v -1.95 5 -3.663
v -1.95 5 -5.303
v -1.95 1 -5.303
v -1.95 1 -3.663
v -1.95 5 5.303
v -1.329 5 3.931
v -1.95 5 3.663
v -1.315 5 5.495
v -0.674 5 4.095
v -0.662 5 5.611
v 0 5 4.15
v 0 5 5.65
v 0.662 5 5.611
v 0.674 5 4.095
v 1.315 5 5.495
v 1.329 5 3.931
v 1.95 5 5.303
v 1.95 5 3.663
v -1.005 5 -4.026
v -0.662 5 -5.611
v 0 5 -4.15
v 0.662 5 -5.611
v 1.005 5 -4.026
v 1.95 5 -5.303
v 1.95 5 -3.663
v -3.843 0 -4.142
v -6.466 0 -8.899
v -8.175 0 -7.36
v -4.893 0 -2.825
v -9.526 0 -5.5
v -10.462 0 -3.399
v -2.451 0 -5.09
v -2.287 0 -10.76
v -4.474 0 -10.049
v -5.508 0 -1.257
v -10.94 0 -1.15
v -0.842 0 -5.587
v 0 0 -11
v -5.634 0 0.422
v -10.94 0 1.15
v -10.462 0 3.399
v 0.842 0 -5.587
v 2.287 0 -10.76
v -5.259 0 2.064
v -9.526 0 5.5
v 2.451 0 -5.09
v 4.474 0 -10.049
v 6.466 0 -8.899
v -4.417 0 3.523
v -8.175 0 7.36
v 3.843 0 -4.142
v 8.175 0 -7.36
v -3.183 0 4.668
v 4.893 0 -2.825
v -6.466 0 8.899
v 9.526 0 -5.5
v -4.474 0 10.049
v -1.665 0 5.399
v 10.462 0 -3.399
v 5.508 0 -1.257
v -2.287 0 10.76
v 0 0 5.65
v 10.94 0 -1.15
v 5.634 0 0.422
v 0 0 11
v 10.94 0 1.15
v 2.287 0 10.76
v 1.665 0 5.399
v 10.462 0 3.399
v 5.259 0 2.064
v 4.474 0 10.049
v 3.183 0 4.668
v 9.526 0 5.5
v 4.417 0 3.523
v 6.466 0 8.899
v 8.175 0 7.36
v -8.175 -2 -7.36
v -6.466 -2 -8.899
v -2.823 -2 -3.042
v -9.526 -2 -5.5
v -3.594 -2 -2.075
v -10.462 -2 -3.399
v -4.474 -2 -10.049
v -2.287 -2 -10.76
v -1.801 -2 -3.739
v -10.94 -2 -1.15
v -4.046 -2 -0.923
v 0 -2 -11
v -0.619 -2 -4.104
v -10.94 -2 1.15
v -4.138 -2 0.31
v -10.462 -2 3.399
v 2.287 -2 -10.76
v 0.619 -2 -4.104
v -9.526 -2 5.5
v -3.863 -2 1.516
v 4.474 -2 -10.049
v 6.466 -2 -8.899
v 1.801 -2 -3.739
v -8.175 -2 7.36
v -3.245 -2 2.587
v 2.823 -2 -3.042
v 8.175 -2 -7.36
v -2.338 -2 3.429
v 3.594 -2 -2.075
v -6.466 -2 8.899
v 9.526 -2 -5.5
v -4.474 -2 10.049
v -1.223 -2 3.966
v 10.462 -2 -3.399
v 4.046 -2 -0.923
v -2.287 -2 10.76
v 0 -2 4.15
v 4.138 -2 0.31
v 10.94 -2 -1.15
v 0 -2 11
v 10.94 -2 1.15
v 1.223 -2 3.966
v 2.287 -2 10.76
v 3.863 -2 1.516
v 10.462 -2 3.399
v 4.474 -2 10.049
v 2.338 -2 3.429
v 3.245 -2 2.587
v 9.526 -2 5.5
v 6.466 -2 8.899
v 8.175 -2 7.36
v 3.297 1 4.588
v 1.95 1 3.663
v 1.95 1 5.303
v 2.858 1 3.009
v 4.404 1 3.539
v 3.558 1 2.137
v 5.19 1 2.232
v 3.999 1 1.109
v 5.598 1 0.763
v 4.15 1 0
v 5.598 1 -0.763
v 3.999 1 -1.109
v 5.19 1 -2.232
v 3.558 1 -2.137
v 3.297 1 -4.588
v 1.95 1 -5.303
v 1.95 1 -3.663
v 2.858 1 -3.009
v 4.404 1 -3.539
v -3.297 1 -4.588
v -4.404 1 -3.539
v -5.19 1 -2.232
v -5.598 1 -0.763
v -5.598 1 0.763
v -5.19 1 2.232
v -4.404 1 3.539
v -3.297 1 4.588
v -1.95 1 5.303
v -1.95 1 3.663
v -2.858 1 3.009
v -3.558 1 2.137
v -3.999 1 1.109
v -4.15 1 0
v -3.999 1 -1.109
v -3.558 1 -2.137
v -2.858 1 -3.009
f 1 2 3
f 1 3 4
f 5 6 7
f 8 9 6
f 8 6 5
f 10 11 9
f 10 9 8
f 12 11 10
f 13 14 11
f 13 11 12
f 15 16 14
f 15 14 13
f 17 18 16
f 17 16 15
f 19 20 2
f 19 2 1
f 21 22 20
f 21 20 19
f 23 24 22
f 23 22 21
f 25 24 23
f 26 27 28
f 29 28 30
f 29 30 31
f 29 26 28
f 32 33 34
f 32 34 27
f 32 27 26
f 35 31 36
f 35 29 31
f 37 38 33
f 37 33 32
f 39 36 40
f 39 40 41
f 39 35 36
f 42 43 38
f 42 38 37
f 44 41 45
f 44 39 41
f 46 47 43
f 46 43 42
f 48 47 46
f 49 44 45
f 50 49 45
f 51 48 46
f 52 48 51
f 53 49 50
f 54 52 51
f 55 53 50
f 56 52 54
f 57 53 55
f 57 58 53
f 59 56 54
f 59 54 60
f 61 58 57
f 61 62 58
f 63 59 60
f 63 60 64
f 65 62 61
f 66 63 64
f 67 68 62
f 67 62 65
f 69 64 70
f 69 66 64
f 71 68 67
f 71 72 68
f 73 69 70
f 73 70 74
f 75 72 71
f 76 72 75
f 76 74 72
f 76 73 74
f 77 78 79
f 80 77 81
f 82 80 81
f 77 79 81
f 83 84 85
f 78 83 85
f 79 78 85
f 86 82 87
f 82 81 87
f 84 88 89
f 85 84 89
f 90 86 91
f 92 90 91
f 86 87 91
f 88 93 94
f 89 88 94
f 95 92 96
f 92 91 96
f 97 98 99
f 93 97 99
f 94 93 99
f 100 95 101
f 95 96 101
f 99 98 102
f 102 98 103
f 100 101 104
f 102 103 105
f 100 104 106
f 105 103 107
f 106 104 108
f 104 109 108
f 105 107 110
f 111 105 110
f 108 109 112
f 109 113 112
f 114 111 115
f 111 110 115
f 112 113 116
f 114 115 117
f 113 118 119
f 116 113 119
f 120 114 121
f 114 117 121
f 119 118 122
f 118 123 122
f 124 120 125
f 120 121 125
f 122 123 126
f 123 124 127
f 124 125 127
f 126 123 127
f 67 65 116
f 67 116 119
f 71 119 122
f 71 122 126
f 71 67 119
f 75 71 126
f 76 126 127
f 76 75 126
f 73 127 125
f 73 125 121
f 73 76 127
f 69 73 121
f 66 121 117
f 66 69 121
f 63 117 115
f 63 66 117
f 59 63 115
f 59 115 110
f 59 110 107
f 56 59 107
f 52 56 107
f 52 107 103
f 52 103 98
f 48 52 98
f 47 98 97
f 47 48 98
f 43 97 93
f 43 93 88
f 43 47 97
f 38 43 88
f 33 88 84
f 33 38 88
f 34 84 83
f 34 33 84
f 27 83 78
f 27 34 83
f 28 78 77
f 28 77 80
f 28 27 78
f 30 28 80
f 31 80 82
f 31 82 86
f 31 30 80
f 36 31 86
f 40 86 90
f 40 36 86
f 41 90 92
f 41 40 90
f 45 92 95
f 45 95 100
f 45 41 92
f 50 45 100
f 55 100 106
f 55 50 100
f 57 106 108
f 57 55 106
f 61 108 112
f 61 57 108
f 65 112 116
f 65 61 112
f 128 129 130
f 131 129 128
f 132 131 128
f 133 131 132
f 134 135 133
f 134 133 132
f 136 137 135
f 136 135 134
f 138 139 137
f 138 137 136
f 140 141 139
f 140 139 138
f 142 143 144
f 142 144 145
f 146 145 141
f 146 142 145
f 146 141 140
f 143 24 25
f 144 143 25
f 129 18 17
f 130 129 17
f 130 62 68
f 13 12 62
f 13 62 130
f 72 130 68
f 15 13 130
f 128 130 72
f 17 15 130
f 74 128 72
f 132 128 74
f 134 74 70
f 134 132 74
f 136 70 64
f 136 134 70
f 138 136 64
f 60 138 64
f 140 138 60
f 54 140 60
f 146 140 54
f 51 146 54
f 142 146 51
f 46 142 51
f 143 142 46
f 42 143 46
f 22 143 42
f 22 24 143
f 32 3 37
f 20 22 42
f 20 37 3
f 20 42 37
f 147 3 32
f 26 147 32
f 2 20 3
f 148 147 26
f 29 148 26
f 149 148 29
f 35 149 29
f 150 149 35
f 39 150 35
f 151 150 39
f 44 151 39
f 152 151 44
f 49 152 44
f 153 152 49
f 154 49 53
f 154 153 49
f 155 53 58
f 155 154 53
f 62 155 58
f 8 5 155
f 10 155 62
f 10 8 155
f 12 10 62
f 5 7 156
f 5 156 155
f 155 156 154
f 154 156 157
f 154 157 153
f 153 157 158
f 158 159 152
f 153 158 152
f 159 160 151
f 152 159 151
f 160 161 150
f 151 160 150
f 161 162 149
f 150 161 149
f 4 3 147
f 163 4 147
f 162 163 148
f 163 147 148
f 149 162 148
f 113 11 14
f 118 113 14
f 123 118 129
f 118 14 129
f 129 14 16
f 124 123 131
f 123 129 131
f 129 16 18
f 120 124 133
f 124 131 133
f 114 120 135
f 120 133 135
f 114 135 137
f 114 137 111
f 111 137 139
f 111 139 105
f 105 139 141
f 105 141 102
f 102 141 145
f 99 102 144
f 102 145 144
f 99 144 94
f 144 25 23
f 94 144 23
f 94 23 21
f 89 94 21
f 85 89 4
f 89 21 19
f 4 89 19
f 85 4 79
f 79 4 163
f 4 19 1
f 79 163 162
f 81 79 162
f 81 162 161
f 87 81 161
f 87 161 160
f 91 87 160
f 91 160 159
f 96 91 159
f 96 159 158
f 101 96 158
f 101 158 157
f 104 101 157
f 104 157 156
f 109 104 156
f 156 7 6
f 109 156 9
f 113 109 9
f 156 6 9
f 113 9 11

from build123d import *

# Parameters (mm, degrees)
SKETCH_1_R          = 11
SKETCH_1_R_2        = 4.15
EXTRUDE_1_DEPTH     = 2
EXTRUDE_START       = 5
SKETCH_1_3_R        = 5.65
SKETCH_1_3_R_2      = 4.15
EXTRUDE_2_DEPTH     = 5
CUT_EXTRUDE_1_DEPTH = 4


with BuildPart() as part:
    # 草图1 → 凸台-拉伸1 (new body)
    with BuildSketch(Plane(origin=(0, 0, 0), x_dir=(1, 0, 0), z_dir=(0, 1, 0))):
        Circle(SKETCH_1_R)
        Circle(SKETCH_1_R_2, mode=Mode.SUBTRACT)
    extrude(amount=-EXTRUDE_1_DEPTH)

    # 草图1<3> → 凸台-拉伸2 (add)
    with BuildSketch(Plane(origin=(0, 0, 0), x_dir=(1, 0, 0), z_dir=(0, 1, 0)).offset(EXTRUDE_START)):
        Circle(SKETCH_1_3_R)
        Circle(SKETCH_1_3_R_2, mode=Mode.SUBTRACT)
    extrude(amount=-EXTRUDE_2_DEPTH)

    # 草图2 → 切除-拉伸1 (cut)
    with BuildSketch(Plane(origin=(0, 5, 0), x_dir=(1, 0, 0), z_dir=(0, 1, 0))):
        with BuildLine():
            Line((1.95, 5.302829433), (1.95, 3.663331817))
            ThreePointArc((1.95, 3.663331817), (4.15, 0), (1.95, -3.663331817))
            Line((1.95, -3.663331817), (1.95, -5.302829433))
            ThreePointArc((1.95, -5.302829433), (5.65, 0), (1.95, 5.302829433))
        make_face()
        with BuildLine():
            Line((-1.95, 5.302829433), (-1.95, 3.663331817))
            ThreePointArc((-1.95, 3.663331817), (-4.15, 0), (-1.95, -3.663331817))
            Line((-1.95, -3.663331817), (-1.95, -5.302829433))
            ThreePointArc((-1.95, -5.302829433), (-5.65, 0), (-1.95, 5.302829433))
        make_face()
    extrude(amount=-CUT_EXTRUDE_1_DEPTH, mode=Mode.SUBTRACT)


solid = part.part
